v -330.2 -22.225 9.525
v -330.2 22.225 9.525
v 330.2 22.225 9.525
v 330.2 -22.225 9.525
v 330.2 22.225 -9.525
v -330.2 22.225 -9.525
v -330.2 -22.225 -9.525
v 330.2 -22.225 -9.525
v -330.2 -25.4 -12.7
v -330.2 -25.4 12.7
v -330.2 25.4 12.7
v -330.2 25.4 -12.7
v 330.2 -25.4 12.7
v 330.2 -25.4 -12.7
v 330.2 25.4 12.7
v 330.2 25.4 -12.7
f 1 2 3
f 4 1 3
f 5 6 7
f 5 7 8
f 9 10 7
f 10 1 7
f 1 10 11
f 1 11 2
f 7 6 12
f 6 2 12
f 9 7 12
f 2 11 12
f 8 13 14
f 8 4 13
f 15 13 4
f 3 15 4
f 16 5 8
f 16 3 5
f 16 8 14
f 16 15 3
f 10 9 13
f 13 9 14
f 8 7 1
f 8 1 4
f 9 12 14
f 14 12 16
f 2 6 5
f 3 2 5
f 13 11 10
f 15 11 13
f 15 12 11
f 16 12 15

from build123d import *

# Parameters (mm, degrees)
SKETCH1_W           = 660.4
SKETCH1_H           = 25.4
BOSS_EXTRUDE1_DEPTH = 25.4
SHELL1_T            = -3.175


with BuildPart() as part:
    # Sketch1 → Boss-Extrude1 (new body, symmetric)
    with BuildSketch(Plane(origin=(0, 0, 0), x_dir=(1, 0, 0), z_dir=(0, 1, 0))):
        Rectangle(SKETCH1_W, SKETCH1_H)
    extrude(amount=BOSS_EXTRUDE1_DEPTH, both=True)

    # Shell1
    shell1_openings = [part.faces().sort_by_distance(p)[0] for p in [
        (-330.2, 0, 0),
        (330.2, 0, 0),
    ]]
    offset(amount=SHELL1_T, openings=shell1_openings, kind=Kind.INTERSECTION)


solid = part.part
